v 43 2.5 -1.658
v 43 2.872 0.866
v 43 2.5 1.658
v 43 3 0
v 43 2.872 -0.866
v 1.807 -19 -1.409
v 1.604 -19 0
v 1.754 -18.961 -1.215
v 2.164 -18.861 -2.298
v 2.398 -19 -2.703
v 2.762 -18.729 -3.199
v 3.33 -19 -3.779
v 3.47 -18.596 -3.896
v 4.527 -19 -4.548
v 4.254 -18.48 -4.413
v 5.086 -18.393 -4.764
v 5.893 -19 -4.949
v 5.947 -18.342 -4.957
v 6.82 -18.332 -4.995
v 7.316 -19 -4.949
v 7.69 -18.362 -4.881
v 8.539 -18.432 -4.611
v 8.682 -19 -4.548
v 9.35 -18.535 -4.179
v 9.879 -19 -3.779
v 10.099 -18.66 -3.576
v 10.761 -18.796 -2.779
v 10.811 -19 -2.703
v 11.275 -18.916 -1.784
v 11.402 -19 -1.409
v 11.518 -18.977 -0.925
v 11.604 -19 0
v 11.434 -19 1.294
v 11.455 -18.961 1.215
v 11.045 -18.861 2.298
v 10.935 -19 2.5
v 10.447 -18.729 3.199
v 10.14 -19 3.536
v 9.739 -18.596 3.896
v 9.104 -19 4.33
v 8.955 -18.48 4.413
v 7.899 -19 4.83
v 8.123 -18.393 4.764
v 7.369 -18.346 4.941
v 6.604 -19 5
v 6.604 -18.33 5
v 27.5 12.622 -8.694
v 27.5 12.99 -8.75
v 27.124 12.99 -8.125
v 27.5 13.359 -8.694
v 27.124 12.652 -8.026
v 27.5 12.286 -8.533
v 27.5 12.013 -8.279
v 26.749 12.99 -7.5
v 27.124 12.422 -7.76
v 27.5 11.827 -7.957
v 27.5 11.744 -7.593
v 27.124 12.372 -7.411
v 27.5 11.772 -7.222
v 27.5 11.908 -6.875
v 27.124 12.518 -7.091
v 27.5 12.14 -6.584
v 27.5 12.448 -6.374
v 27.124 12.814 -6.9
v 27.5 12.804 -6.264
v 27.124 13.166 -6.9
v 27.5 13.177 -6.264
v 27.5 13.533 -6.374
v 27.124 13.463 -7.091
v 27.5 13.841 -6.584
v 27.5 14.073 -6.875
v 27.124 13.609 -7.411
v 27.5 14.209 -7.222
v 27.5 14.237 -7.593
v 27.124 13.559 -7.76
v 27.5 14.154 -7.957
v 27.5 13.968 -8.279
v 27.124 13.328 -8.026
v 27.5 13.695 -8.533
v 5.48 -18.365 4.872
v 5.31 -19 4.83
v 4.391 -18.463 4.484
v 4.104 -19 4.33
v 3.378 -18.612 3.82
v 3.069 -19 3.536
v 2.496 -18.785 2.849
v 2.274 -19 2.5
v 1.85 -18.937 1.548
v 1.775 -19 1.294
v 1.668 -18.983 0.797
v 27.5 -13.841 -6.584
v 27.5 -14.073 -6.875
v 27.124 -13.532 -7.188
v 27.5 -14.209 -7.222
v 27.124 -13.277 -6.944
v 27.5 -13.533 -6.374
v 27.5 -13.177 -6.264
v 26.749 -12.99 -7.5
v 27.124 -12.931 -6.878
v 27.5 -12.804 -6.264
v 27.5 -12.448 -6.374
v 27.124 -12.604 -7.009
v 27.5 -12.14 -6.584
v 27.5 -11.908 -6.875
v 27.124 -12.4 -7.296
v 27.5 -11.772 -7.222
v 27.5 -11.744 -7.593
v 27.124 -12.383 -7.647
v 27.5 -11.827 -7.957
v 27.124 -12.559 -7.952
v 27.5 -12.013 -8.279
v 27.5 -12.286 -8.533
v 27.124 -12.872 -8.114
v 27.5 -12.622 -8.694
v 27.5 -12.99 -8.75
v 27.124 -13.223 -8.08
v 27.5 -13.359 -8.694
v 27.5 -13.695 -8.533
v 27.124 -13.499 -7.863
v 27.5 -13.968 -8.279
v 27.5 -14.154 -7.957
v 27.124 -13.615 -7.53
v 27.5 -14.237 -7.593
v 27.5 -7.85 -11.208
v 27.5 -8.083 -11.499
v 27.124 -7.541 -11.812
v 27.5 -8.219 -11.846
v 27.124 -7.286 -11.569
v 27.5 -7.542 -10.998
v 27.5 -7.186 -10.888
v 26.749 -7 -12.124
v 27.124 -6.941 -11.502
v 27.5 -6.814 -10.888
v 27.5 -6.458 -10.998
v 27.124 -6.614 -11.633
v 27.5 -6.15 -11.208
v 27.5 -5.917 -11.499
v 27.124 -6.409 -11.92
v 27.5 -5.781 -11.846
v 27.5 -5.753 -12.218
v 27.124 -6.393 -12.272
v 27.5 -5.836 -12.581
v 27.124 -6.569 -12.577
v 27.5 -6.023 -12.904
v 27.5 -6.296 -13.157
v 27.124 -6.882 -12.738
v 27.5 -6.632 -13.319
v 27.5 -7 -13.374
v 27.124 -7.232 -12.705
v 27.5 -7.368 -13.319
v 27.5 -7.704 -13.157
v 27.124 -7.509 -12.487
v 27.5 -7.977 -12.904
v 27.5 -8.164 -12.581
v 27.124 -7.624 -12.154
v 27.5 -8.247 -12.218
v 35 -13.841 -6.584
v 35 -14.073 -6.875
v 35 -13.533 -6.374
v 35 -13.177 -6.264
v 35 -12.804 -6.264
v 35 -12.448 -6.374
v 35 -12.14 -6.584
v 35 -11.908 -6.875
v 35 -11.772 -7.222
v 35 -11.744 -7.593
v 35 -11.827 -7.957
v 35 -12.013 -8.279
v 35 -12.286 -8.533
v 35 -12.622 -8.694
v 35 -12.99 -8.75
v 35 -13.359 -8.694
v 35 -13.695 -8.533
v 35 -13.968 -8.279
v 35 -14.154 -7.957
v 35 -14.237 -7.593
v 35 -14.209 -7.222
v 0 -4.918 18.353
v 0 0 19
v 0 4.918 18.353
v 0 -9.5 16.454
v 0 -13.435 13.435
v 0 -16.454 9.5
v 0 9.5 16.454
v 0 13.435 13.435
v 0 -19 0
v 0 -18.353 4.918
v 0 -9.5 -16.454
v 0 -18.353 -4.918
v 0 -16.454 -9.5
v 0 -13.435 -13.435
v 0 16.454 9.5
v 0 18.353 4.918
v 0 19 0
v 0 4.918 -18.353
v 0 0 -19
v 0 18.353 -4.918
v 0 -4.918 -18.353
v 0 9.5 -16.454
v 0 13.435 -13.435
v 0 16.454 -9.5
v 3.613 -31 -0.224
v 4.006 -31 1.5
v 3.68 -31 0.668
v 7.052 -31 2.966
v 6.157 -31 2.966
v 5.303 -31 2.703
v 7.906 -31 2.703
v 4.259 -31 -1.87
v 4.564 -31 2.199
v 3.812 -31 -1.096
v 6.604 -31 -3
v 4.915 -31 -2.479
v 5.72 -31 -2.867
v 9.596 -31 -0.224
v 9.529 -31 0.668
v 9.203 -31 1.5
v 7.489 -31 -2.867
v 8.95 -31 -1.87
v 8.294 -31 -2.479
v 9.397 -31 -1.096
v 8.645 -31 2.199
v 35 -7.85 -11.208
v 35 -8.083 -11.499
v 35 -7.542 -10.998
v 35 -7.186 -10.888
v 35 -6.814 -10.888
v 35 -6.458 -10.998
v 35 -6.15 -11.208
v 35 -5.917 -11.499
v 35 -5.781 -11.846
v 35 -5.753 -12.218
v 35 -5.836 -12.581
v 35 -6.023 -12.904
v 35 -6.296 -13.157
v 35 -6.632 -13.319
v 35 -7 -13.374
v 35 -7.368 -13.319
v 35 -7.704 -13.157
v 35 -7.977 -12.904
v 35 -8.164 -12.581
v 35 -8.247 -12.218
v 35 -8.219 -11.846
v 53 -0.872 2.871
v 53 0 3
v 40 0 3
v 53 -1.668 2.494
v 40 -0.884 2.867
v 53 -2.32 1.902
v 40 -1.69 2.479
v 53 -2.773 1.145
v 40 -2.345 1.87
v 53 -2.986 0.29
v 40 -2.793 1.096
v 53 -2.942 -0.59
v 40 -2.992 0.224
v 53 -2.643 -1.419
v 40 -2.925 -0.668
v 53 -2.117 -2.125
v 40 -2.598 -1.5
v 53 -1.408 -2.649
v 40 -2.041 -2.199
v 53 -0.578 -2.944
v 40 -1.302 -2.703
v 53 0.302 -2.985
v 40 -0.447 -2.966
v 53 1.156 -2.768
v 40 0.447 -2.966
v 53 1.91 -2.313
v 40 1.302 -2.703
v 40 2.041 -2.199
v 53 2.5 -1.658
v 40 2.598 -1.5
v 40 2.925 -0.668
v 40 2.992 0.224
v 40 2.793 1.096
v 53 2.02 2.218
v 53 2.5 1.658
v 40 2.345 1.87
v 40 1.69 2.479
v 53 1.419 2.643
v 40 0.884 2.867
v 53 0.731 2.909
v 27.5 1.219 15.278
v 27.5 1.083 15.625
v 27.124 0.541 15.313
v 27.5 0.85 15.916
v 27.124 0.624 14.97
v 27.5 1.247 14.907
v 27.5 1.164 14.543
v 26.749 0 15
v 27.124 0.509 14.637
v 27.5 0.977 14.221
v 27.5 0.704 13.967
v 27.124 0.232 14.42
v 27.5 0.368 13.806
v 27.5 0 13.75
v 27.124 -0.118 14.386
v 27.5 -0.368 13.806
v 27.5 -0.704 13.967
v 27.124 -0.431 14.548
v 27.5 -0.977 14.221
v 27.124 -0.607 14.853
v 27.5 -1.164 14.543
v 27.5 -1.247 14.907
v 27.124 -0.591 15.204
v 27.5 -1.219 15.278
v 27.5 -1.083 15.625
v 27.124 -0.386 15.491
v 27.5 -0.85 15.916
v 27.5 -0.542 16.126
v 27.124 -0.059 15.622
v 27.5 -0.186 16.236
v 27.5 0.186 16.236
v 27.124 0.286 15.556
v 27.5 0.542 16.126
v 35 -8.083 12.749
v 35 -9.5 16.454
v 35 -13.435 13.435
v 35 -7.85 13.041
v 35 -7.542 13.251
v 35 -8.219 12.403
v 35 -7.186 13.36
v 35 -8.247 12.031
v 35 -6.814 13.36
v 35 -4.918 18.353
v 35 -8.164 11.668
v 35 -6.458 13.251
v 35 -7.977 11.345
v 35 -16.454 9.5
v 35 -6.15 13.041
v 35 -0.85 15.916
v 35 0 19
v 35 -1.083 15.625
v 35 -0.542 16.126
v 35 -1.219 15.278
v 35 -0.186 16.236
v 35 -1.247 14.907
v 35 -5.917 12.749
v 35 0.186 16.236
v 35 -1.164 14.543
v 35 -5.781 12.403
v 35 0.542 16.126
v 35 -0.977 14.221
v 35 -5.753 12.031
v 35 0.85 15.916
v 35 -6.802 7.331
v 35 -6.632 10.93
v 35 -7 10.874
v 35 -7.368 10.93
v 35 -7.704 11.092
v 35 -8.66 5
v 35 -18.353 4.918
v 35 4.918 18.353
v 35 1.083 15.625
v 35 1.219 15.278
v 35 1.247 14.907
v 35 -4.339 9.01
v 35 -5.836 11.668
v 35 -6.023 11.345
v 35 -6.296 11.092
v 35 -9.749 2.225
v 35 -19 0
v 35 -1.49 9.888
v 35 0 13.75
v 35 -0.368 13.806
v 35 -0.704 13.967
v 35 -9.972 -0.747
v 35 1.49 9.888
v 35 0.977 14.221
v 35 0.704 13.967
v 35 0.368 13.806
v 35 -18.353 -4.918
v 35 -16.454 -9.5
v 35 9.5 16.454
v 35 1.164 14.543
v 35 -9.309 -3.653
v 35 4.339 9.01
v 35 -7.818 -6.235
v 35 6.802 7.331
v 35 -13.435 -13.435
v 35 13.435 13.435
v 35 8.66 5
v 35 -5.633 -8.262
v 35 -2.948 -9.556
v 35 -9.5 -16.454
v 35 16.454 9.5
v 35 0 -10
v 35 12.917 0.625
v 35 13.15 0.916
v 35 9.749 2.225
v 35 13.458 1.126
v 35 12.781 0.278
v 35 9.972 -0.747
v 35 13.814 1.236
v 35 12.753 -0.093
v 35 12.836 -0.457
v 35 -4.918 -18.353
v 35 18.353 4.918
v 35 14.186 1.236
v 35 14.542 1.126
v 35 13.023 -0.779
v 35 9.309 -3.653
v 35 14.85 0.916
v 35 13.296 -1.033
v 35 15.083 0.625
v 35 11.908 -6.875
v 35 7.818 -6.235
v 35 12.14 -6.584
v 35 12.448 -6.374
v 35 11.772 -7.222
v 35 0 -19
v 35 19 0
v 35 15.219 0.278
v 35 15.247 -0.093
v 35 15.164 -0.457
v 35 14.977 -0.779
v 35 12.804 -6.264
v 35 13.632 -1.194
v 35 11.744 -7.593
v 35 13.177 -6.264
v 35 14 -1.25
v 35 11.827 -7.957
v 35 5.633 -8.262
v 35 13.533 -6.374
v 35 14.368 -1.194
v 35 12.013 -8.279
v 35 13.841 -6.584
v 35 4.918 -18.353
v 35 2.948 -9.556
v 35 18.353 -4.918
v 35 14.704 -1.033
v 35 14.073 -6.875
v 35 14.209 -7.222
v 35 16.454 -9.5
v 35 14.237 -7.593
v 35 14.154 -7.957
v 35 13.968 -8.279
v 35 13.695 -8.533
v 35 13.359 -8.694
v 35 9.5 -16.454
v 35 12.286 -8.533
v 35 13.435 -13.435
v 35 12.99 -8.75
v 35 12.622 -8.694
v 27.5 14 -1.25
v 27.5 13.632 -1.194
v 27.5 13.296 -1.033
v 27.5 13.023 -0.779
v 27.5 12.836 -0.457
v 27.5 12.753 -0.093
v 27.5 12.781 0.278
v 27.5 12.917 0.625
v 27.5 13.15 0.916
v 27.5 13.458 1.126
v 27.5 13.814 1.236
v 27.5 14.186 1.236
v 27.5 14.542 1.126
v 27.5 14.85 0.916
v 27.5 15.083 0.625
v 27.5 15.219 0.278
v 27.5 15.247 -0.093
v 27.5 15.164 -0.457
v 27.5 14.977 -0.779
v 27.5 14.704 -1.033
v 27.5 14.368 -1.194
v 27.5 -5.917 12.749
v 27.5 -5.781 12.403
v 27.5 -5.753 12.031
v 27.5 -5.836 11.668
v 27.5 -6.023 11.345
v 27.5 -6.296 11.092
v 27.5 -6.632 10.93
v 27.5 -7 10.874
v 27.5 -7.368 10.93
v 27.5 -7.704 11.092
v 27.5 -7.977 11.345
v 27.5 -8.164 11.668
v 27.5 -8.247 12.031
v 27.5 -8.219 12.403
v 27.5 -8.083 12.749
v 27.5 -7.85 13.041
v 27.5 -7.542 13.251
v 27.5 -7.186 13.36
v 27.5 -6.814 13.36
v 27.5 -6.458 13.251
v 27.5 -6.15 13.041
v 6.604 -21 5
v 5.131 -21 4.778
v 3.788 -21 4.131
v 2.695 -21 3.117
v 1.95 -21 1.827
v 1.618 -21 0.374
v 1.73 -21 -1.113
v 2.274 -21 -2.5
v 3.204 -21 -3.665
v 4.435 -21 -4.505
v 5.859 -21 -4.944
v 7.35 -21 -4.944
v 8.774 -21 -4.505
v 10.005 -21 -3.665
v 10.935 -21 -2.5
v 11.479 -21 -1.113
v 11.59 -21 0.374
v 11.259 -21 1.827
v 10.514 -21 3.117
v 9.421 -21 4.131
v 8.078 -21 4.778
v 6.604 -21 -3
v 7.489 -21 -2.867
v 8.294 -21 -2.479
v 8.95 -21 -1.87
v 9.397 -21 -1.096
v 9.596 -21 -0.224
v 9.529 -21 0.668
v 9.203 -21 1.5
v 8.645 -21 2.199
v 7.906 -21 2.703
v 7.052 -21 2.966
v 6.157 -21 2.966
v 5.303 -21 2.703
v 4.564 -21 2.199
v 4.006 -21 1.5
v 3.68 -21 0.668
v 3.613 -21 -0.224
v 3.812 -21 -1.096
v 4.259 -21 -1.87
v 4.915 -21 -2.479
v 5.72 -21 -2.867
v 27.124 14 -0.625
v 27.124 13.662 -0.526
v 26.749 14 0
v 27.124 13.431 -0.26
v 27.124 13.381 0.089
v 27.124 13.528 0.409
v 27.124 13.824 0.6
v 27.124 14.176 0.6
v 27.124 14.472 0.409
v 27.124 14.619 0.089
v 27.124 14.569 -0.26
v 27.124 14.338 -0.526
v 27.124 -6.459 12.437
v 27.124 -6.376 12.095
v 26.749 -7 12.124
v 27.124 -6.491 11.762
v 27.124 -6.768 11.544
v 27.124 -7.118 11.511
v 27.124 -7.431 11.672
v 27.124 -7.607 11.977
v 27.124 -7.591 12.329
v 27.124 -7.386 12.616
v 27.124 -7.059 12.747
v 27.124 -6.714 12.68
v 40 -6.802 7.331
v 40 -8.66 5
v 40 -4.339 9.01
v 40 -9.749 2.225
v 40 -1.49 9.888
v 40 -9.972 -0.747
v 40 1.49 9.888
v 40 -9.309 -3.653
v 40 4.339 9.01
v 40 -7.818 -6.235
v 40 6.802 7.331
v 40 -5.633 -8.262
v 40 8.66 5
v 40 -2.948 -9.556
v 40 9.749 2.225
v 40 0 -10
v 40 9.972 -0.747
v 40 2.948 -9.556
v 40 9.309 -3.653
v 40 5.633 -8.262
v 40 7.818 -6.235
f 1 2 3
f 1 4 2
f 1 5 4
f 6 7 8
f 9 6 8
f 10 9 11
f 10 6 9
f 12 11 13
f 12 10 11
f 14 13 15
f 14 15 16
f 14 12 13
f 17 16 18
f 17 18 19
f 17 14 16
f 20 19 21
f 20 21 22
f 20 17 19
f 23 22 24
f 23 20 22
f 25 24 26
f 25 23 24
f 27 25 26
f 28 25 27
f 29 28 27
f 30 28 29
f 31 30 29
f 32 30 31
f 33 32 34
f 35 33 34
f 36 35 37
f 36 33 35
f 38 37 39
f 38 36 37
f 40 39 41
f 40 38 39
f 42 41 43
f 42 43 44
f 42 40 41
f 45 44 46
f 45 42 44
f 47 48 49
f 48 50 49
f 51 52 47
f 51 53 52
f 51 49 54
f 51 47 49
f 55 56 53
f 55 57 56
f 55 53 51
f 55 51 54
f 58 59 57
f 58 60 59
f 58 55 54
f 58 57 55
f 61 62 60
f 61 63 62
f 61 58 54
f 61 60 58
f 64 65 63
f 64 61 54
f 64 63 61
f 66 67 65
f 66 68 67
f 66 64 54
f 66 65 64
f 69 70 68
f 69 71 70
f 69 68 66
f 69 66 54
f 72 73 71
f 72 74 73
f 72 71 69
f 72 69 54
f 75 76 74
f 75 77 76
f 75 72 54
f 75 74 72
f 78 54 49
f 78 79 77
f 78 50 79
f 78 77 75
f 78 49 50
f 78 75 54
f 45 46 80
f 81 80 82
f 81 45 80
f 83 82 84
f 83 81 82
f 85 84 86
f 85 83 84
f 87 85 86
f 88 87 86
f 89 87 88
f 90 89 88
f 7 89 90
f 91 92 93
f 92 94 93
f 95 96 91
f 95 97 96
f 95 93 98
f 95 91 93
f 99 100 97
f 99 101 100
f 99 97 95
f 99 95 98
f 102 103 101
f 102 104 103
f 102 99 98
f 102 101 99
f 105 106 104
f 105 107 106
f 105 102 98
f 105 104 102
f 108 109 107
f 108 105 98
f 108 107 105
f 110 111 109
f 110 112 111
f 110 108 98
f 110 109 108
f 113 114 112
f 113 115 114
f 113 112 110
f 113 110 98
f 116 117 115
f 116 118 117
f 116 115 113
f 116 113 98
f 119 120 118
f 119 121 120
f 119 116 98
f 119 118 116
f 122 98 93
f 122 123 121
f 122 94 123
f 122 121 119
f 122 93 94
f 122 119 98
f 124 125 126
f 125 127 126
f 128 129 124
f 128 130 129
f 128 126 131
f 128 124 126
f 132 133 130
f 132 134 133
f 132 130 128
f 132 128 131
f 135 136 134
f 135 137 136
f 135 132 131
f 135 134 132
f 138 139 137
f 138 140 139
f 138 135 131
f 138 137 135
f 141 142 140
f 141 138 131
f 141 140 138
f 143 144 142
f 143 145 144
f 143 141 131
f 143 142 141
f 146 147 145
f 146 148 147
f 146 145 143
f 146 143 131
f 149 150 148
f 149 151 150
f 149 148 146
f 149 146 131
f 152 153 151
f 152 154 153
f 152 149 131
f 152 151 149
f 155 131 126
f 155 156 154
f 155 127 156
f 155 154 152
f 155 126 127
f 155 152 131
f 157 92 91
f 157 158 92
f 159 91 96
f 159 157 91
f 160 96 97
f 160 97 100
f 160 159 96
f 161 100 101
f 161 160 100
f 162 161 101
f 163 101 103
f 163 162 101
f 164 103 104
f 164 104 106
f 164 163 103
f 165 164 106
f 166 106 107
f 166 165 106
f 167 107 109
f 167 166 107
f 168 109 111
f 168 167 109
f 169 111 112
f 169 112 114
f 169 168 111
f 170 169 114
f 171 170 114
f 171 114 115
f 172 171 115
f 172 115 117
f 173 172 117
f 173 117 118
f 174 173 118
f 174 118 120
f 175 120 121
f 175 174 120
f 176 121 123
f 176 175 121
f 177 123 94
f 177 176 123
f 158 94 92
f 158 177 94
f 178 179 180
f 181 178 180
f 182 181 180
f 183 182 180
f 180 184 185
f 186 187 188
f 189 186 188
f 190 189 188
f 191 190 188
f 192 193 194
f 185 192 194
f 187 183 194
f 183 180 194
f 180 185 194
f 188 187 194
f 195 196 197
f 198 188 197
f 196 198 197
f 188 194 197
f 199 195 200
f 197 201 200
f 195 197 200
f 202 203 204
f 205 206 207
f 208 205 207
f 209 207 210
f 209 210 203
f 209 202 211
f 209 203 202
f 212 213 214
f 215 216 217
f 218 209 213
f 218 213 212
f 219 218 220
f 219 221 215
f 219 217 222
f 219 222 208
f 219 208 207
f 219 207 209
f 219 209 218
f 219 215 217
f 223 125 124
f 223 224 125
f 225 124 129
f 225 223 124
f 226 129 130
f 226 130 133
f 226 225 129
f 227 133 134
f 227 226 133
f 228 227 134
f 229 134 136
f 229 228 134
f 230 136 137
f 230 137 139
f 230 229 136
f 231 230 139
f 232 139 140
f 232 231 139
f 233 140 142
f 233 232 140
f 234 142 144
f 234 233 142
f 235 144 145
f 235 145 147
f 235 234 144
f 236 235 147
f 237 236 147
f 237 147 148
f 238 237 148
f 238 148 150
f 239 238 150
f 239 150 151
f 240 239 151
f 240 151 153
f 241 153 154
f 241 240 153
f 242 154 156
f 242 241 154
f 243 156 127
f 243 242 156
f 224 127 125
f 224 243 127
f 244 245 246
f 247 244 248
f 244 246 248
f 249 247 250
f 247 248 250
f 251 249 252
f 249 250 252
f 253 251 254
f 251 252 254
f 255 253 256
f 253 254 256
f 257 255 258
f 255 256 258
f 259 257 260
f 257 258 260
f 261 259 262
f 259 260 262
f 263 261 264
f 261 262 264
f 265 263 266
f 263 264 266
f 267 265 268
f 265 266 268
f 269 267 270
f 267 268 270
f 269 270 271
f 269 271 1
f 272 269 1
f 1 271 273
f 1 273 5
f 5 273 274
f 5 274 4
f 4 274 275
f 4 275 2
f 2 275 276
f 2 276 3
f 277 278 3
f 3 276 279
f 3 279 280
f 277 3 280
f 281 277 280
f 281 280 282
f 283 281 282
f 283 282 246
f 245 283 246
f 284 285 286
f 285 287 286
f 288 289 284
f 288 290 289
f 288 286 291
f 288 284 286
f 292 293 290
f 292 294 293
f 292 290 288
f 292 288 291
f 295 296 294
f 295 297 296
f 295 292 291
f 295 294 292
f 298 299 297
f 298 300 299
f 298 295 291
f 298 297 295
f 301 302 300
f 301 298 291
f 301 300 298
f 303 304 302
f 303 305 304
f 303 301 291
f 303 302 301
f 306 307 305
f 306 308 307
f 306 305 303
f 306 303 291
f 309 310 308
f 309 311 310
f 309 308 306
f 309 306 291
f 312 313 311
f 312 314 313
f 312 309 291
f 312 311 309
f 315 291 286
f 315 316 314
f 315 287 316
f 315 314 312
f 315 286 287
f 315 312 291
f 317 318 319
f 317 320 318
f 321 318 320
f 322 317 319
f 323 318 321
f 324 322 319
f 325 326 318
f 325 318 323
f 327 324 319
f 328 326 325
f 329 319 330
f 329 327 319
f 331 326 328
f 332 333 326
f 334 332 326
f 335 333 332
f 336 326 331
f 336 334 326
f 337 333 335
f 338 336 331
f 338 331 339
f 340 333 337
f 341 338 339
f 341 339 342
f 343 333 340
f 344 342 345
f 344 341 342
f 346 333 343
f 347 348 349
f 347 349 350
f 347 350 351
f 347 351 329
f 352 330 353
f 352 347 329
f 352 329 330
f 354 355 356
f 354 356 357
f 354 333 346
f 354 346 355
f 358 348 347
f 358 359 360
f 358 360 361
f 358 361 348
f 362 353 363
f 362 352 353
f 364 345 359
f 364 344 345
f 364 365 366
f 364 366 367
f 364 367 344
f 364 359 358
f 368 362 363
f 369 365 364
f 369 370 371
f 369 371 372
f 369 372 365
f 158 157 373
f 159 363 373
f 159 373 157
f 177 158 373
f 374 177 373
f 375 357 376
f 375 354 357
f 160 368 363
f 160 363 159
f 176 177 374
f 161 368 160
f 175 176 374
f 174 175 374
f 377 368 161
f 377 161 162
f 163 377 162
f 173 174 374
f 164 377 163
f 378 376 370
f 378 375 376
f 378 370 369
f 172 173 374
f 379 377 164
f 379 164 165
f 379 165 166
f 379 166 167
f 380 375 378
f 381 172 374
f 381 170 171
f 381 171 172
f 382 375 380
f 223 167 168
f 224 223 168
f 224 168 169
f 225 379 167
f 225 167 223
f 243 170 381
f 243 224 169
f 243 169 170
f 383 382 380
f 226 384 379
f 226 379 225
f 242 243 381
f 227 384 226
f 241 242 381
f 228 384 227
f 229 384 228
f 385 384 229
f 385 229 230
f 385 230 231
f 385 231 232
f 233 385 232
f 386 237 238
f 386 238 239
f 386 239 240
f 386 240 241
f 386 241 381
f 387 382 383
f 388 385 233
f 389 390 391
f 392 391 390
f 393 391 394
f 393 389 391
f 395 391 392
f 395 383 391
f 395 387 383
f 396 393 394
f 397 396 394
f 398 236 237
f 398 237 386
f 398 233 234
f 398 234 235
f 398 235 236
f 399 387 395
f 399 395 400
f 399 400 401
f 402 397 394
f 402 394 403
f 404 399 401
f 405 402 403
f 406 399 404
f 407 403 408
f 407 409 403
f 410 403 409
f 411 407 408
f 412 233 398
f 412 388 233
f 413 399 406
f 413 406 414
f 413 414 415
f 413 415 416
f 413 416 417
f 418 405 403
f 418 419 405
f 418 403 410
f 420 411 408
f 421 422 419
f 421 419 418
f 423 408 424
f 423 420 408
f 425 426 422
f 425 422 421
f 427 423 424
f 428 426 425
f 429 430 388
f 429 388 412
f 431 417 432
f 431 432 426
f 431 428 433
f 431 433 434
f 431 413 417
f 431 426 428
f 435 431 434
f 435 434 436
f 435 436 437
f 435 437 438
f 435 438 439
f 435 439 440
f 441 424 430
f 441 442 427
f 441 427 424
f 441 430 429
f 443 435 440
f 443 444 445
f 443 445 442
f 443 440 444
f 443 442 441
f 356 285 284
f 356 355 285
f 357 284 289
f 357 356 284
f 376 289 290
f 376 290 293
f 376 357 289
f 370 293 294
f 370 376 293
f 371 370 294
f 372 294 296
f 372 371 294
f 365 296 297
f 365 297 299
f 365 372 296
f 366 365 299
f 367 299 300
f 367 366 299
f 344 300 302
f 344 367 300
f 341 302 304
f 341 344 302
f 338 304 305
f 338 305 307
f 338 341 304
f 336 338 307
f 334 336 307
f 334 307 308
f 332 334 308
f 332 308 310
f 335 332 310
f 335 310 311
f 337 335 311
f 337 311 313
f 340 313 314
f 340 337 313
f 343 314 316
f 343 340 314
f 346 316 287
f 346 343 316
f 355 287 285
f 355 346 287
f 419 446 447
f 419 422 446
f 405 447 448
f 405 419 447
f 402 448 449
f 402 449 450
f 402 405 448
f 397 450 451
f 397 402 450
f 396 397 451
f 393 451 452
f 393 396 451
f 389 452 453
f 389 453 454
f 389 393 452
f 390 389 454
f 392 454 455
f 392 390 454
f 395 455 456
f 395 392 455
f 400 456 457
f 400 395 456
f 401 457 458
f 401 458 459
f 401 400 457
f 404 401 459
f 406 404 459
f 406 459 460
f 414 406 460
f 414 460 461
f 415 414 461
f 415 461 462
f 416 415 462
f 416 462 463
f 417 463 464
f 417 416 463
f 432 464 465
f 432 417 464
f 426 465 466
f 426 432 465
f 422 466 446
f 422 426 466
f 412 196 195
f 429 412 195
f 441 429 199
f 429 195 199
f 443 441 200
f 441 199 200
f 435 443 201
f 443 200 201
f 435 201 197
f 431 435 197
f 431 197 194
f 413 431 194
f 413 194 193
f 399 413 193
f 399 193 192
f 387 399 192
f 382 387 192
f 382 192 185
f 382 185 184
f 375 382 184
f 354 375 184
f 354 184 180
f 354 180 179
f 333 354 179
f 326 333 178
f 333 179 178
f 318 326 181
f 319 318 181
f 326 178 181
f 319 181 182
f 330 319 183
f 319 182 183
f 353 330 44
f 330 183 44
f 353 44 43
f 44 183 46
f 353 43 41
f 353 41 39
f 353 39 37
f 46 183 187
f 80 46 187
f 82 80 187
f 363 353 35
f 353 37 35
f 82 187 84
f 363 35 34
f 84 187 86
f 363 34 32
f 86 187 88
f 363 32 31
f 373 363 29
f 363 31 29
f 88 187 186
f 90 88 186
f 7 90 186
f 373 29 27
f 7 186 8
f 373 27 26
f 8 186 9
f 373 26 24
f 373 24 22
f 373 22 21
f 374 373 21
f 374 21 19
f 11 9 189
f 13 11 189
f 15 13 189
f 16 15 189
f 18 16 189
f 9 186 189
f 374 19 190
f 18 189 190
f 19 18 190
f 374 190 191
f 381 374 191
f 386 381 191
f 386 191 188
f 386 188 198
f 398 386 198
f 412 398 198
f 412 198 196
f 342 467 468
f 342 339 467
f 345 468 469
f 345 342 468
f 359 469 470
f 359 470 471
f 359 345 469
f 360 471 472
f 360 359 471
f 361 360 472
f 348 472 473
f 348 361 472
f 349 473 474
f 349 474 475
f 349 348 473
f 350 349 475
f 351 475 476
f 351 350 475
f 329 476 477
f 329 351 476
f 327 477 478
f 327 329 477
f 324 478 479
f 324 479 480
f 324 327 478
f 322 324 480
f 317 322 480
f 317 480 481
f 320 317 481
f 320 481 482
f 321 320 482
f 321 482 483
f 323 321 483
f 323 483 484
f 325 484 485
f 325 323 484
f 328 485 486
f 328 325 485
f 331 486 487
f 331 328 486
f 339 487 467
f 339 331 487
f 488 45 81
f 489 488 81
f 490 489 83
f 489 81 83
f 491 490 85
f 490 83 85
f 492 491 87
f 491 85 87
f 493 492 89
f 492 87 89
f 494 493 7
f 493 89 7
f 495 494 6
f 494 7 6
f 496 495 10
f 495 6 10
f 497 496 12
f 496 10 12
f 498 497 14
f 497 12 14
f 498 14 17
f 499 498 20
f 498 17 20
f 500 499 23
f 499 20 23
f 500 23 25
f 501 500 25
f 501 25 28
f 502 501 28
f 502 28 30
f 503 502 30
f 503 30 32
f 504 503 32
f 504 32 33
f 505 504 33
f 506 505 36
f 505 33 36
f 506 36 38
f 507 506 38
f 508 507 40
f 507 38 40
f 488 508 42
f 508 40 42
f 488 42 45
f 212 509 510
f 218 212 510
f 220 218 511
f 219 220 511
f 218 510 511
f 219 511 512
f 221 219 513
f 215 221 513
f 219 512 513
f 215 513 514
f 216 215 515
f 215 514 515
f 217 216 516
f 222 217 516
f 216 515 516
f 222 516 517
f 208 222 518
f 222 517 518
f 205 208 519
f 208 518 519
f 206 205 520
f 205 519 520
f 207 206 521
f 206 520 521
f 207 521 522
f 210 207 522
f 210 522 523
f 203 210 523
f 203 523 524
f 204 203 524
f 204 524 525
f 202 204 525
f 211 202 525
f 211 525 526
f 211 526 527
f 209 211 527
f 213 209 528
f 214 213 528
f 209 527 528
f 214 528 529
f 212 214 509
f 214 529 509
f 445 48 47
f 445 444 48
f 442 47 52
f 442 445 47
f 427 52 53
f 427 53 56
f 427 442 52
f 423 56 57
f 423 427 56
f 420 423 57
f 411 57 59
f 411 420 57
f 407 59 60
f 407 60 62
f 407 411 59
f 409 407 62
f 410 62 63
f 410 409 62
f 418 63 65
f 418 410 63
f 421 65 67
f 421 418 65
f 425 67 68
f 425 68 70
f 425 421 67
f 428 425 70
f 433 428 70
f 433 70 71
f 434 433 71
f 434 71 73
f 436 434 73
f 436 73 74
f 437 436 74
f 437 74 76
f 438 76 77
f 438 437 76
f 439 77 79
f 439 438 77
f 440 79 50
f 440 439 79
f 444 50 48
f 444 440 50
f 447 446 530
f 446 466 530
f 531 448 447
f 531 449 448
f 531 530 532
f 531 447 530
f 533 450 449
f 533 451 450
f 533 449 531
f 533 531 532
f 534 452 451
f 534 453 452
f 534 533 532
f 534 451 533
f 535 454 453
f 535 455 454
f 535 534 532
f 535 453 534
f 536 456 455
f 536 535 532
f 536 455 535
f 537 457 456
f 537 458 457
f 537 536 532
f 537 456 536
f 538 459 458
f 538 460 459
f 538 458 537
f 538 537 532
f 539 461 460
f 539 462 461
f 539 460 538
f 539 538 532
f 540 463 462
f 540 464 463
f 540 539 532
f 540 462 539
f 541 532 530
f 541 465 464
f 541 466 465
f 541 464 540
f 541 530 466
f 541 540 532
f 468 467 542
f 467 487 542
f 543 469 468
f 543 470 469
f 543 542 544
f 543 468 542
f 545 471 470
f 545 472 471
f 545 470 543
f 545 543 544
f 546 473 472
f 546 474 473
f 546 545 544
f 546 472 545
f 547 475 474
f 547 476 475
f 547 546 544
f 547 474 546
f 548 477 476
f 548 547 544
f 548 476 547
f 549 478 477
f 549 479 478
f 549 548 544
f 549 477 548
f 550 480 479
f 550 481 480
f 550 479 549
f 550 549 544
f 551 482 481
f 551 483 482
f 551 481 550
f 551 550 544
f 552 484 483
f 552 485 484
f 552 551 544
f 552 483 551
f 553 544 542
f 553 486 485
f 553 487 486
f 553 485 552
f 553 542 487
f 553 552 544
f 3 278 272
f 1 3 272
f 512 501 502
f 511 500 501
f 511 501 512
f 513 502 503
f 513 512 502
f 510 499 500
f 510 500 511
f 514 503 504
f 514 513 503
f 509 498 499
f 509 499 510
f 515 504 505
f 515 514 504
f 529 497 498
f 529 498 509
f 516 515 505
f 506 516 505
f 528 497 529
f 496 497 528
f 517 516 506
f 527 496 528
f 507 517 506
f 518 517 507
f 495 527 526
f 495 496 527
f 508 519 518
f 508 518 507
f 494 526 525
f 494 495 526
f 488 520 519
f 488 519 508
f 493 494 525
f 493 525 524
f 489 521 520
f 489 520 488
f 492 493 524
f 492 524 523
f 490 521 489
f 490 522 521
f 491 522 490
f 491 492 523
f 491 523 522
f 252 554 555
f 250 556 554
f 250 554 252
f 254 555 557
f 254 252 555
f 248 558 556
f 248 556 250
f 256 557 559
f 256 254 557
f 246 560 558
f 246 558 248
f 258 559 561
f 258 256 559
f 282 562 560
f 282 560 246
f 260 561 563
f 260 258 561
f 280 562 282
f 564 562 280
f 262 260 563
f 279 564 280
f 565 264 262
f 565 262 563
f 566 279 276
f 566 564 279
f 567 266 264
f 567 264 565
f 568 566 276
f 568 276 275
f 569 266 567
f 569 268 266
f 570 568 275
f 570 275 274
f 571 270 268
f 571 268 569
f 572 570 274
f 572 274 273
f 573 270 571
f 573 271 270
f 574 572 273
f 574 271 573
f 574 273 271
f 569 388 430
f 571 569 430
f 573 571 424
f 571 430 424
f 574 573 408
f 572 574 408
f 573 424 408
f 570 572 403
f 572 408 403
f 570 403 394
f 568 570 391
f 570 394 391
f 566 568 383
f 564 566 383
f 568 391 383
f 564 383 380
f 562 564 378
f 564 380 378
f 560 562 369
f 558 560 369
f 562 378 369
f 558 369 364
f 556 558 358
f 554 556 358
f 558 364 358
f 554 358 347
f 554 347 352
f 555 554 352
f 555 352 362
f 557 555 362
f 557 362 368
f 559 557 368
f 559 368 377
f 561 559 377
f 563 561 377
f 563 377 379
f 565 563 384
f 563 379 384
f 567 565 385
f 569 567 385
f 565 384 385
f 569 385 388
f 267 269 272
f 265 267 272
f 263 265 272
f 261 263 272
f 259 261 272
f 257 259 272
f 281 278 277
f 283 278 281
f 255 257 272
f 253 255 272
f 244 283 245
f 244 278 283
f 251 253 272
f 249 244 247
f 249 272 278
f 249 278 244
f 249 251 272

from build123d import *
from build123d.topology import SkipClean

# Parameters (mm, degrees)
SKETCH1_R                            = 19
BOSS_EXTRUDE1_DEPTH                  = 35
SKETCH2_R                            = 10
BOSS_EXTRUDE2_DEPTH                  = 5
SKETCH3_R                            = 3
BOSS_EXTRUDE3_DEPTH                  = 13
SKETCH4_W                            = 10.869693714
SKETCH4_H                            = 3.318117029
CUT_EXTRUDE1_DEPTH                   = 10
SKETCH5_R                            = 5
BOSS_EXTRUDE4_DEPTH                  = 2
BOSS_EXTRUDE4_DIRECTION_2_REACH      = 69.926
BOSS_EXTRUDE4_DIRECTION_2_END_RADIUS = 19
SKETCH6_R                            = 3
BOSS_EXTRUDE5_DEPTH                  = 10
M3_TAPPED_HOLE1_AT_2_COUNT           = 2
M3_TAPPED_HOLE1_AT_2_PITCH           = 7.567650257
CIRPATTERN1_COUNT                    = 3


with BuildPart() as part:
    # Sketch1 → Boss-Extrude1 (new body)
    with BuildSketch(Plane(origin=(0, 0, 0), x_dir=(0, 0, -1), z_dir=(1, 0, 0))):
        Circle(SKETCH1_R)
    extrude(amount=BOSS_EXTRUDE1_DEPTH)

    # Sketch2 → Boss-Extrude2 (add)
    with BuildSketch(Plane(origin=(35, 0, 0), x_dir=(0, 0, -1), z_dir=(1, 0, 0))):
        Circle(SKETCH2_R)
    extrude(amount=BOSS_EXTRUDE2_DEPTH)

    # Sketch3 → Boss-Extrude3 (add)
    with BuildSketch(Plane(origin=(40, 0, 0), x_dir=(0, 0, -1), z_dir=(1, 0, 0))):
        with Locations(Location((0, 0, 0), (0, 0, 180))):
            Circle(SKETCH3_R)
    extrude(amount=BOSS_EXTRUDE3_DEPTH)

    # Sketch4 → Cut-Extrude1 (cut)
    with BuildSketch(Plane(origin=(53, 0, 0), x_dir=(0, 0, -1), z_dir=(1, 0, 0))):
        with Locations((-0.046103434, 4.159058514)):
            Rectangle(SKETCH4_W, SKETCH4_H)
    extrude(amount=-CUT_EXTRUDE1_DEPTH, mode=Mode.SUBTRACT)

    # Sketch5 → Boss-Extrude4 (add)
    with BuildSketch(Plane(origin=(0, -19, 0), x_dir=(-1, 0, 0), z_dir=(0, -1, 0))):
        with Locations(Location((-6.604465085, 0, 0), (0, 0, 270))):
            Circle(SKETCH5_R)
    extrude(amount=BOSS_EXTRUDE4_DEPTH)

    # Boss-Extrude4 direction 2: up to this cylinder (the profile starts outside it)
    with SkipClean():  # the faces are left unmerged after this step: merging them gives an invalid solid
        boss_extrude4_direction_2_end = Plane(origin=(6.604465, 0, 0), z_dir=(-1, 0, 0)) * Cylinder(BOSS_EXTRUDE4_DIRECTION_2_END_RADIUS, 178.852, mode=Mode.PRIVATE)
        # Sketch5 → Boss-Extrude4 direction 2 (add, up to the surface)
        with BuildSketch(Plane(origin=(0, -19, 0), x_dir=(-1, 0, 0), z_dir=(0, -1, 0)), mode=Mode.PRIVATE) as boss_extrude4_direction_2_sk1:
            with Locations(Location((-6.604465085, 0, 0), (0, 0, 270))):
                Circle(SKETCH5_R)
        boss_extrude4_direction_2_tool1 = extrude(boss_extrude4_direction_2_sk1.sketch, amount=-BOSS_EXTRUDE4_DIRECTION_2_REACH, mode=Mode.PRIVATE) - boss_extrude4_direction_2_end
        add(boss_extrude4_direction_2_tool1.solids().sort_by_distance((6.604465, -19, 0))[0])
        add(boss_extrude4_direction_2_tool1.solids().sort_by_distance((6.604465, -19, 0))[1])

    # Sketch6 → Boss-Extrude5 (add)
    with BuildSketch(Plane.XZ.offset(21)):
        with Locations(Location((6.604465085, 0, 0), (0, 0, 270))):
            Circle(SKETCH6_R)
    extrude(amount=BOSS_EXTRUDE5_DEPTH)

    # Sketch10 → M3 Tapped Hole1 (revolve, cut)
    with BuildSketch(Plane(origin=(35, 12.990381057, -7.5), x_dir=(0, 0, -1), z_dir=(0, 1, 0))):
        Polygon((0, 0), (0, 8.251075774), (1.25, 7.5), (1.25, 0), align=None)
    m3_tapped_hole1 = revolve(axis=Axis((41.35, 12.990381057, -7.5), (-1, 0, 0)), mode=Mode.SUBTRACT)

    # M3 Tapped Hole1 at 2: M3 Tapped Hole1 ×2
    with Locations(*[Vector(0, 0.13341247401263537, 0.9910605994477977) * (i * M3_TAPPED_HOLE1_AT_2_PITCH) for i in range(1, M3_TAPPED_HOLE1_AT_2_COUNT)]):
        add(m3_tapped_hole1, mode=Mode.SUBTRACT)

    # CirPattern1: M3 Tapped Hole1 ×3 about axis
    cirpattern1_axis = Axis((0, 0, 0), (1, 0, 0))
    for i in range(1, CIRPATTERN1_COUNT):
        add(m3_tapped_hole1.rotate(cirpattern1_axis, i * 360 / CIRPATTERN1_COUNT), mode=Mode.SUBTRACT)

    # CirPattern1 copy 1 sketch → CirPattern1 copy 1 (revolve, cut)
    with BuildSketch(Plane(origin=(35, -7, 12.124355653), x_dir=(0, 0.8660254037844387, 0.4999999999999998), z_dir=(0, -0.4999999999999998, 0.8660254037844387))):
        Polygon((0, 0), (0, 8.251075774), (1.25, 7.5), (1.25, 0), align=None)
    revolve(axis=Axis((41.35, -7, 12.124355653), (-1, 0, 0)), mode=Mode.SUBTRACT)

    # CirPattern1 copy 2 sketch → CirPattern1 copy 2 (revolve, cut)
    with BuildSketch(Plane(origin=(35, -7, -12.124355653), x_dir=(0, -0.8660254037844384, 0.5000000000000004), z_dir=(0, -0.5000000000000004, -0.8660254037844384))):
        Polygon((0, 0), (0, 8.251075774), (1.25, 7.5), (1.25, 0), align=None)
    revolve(axis=Axis((41.35, -7, -12.124355653), (-1, 0, 0)), mode=Mode.SUBTRACT)


solid = part.part
